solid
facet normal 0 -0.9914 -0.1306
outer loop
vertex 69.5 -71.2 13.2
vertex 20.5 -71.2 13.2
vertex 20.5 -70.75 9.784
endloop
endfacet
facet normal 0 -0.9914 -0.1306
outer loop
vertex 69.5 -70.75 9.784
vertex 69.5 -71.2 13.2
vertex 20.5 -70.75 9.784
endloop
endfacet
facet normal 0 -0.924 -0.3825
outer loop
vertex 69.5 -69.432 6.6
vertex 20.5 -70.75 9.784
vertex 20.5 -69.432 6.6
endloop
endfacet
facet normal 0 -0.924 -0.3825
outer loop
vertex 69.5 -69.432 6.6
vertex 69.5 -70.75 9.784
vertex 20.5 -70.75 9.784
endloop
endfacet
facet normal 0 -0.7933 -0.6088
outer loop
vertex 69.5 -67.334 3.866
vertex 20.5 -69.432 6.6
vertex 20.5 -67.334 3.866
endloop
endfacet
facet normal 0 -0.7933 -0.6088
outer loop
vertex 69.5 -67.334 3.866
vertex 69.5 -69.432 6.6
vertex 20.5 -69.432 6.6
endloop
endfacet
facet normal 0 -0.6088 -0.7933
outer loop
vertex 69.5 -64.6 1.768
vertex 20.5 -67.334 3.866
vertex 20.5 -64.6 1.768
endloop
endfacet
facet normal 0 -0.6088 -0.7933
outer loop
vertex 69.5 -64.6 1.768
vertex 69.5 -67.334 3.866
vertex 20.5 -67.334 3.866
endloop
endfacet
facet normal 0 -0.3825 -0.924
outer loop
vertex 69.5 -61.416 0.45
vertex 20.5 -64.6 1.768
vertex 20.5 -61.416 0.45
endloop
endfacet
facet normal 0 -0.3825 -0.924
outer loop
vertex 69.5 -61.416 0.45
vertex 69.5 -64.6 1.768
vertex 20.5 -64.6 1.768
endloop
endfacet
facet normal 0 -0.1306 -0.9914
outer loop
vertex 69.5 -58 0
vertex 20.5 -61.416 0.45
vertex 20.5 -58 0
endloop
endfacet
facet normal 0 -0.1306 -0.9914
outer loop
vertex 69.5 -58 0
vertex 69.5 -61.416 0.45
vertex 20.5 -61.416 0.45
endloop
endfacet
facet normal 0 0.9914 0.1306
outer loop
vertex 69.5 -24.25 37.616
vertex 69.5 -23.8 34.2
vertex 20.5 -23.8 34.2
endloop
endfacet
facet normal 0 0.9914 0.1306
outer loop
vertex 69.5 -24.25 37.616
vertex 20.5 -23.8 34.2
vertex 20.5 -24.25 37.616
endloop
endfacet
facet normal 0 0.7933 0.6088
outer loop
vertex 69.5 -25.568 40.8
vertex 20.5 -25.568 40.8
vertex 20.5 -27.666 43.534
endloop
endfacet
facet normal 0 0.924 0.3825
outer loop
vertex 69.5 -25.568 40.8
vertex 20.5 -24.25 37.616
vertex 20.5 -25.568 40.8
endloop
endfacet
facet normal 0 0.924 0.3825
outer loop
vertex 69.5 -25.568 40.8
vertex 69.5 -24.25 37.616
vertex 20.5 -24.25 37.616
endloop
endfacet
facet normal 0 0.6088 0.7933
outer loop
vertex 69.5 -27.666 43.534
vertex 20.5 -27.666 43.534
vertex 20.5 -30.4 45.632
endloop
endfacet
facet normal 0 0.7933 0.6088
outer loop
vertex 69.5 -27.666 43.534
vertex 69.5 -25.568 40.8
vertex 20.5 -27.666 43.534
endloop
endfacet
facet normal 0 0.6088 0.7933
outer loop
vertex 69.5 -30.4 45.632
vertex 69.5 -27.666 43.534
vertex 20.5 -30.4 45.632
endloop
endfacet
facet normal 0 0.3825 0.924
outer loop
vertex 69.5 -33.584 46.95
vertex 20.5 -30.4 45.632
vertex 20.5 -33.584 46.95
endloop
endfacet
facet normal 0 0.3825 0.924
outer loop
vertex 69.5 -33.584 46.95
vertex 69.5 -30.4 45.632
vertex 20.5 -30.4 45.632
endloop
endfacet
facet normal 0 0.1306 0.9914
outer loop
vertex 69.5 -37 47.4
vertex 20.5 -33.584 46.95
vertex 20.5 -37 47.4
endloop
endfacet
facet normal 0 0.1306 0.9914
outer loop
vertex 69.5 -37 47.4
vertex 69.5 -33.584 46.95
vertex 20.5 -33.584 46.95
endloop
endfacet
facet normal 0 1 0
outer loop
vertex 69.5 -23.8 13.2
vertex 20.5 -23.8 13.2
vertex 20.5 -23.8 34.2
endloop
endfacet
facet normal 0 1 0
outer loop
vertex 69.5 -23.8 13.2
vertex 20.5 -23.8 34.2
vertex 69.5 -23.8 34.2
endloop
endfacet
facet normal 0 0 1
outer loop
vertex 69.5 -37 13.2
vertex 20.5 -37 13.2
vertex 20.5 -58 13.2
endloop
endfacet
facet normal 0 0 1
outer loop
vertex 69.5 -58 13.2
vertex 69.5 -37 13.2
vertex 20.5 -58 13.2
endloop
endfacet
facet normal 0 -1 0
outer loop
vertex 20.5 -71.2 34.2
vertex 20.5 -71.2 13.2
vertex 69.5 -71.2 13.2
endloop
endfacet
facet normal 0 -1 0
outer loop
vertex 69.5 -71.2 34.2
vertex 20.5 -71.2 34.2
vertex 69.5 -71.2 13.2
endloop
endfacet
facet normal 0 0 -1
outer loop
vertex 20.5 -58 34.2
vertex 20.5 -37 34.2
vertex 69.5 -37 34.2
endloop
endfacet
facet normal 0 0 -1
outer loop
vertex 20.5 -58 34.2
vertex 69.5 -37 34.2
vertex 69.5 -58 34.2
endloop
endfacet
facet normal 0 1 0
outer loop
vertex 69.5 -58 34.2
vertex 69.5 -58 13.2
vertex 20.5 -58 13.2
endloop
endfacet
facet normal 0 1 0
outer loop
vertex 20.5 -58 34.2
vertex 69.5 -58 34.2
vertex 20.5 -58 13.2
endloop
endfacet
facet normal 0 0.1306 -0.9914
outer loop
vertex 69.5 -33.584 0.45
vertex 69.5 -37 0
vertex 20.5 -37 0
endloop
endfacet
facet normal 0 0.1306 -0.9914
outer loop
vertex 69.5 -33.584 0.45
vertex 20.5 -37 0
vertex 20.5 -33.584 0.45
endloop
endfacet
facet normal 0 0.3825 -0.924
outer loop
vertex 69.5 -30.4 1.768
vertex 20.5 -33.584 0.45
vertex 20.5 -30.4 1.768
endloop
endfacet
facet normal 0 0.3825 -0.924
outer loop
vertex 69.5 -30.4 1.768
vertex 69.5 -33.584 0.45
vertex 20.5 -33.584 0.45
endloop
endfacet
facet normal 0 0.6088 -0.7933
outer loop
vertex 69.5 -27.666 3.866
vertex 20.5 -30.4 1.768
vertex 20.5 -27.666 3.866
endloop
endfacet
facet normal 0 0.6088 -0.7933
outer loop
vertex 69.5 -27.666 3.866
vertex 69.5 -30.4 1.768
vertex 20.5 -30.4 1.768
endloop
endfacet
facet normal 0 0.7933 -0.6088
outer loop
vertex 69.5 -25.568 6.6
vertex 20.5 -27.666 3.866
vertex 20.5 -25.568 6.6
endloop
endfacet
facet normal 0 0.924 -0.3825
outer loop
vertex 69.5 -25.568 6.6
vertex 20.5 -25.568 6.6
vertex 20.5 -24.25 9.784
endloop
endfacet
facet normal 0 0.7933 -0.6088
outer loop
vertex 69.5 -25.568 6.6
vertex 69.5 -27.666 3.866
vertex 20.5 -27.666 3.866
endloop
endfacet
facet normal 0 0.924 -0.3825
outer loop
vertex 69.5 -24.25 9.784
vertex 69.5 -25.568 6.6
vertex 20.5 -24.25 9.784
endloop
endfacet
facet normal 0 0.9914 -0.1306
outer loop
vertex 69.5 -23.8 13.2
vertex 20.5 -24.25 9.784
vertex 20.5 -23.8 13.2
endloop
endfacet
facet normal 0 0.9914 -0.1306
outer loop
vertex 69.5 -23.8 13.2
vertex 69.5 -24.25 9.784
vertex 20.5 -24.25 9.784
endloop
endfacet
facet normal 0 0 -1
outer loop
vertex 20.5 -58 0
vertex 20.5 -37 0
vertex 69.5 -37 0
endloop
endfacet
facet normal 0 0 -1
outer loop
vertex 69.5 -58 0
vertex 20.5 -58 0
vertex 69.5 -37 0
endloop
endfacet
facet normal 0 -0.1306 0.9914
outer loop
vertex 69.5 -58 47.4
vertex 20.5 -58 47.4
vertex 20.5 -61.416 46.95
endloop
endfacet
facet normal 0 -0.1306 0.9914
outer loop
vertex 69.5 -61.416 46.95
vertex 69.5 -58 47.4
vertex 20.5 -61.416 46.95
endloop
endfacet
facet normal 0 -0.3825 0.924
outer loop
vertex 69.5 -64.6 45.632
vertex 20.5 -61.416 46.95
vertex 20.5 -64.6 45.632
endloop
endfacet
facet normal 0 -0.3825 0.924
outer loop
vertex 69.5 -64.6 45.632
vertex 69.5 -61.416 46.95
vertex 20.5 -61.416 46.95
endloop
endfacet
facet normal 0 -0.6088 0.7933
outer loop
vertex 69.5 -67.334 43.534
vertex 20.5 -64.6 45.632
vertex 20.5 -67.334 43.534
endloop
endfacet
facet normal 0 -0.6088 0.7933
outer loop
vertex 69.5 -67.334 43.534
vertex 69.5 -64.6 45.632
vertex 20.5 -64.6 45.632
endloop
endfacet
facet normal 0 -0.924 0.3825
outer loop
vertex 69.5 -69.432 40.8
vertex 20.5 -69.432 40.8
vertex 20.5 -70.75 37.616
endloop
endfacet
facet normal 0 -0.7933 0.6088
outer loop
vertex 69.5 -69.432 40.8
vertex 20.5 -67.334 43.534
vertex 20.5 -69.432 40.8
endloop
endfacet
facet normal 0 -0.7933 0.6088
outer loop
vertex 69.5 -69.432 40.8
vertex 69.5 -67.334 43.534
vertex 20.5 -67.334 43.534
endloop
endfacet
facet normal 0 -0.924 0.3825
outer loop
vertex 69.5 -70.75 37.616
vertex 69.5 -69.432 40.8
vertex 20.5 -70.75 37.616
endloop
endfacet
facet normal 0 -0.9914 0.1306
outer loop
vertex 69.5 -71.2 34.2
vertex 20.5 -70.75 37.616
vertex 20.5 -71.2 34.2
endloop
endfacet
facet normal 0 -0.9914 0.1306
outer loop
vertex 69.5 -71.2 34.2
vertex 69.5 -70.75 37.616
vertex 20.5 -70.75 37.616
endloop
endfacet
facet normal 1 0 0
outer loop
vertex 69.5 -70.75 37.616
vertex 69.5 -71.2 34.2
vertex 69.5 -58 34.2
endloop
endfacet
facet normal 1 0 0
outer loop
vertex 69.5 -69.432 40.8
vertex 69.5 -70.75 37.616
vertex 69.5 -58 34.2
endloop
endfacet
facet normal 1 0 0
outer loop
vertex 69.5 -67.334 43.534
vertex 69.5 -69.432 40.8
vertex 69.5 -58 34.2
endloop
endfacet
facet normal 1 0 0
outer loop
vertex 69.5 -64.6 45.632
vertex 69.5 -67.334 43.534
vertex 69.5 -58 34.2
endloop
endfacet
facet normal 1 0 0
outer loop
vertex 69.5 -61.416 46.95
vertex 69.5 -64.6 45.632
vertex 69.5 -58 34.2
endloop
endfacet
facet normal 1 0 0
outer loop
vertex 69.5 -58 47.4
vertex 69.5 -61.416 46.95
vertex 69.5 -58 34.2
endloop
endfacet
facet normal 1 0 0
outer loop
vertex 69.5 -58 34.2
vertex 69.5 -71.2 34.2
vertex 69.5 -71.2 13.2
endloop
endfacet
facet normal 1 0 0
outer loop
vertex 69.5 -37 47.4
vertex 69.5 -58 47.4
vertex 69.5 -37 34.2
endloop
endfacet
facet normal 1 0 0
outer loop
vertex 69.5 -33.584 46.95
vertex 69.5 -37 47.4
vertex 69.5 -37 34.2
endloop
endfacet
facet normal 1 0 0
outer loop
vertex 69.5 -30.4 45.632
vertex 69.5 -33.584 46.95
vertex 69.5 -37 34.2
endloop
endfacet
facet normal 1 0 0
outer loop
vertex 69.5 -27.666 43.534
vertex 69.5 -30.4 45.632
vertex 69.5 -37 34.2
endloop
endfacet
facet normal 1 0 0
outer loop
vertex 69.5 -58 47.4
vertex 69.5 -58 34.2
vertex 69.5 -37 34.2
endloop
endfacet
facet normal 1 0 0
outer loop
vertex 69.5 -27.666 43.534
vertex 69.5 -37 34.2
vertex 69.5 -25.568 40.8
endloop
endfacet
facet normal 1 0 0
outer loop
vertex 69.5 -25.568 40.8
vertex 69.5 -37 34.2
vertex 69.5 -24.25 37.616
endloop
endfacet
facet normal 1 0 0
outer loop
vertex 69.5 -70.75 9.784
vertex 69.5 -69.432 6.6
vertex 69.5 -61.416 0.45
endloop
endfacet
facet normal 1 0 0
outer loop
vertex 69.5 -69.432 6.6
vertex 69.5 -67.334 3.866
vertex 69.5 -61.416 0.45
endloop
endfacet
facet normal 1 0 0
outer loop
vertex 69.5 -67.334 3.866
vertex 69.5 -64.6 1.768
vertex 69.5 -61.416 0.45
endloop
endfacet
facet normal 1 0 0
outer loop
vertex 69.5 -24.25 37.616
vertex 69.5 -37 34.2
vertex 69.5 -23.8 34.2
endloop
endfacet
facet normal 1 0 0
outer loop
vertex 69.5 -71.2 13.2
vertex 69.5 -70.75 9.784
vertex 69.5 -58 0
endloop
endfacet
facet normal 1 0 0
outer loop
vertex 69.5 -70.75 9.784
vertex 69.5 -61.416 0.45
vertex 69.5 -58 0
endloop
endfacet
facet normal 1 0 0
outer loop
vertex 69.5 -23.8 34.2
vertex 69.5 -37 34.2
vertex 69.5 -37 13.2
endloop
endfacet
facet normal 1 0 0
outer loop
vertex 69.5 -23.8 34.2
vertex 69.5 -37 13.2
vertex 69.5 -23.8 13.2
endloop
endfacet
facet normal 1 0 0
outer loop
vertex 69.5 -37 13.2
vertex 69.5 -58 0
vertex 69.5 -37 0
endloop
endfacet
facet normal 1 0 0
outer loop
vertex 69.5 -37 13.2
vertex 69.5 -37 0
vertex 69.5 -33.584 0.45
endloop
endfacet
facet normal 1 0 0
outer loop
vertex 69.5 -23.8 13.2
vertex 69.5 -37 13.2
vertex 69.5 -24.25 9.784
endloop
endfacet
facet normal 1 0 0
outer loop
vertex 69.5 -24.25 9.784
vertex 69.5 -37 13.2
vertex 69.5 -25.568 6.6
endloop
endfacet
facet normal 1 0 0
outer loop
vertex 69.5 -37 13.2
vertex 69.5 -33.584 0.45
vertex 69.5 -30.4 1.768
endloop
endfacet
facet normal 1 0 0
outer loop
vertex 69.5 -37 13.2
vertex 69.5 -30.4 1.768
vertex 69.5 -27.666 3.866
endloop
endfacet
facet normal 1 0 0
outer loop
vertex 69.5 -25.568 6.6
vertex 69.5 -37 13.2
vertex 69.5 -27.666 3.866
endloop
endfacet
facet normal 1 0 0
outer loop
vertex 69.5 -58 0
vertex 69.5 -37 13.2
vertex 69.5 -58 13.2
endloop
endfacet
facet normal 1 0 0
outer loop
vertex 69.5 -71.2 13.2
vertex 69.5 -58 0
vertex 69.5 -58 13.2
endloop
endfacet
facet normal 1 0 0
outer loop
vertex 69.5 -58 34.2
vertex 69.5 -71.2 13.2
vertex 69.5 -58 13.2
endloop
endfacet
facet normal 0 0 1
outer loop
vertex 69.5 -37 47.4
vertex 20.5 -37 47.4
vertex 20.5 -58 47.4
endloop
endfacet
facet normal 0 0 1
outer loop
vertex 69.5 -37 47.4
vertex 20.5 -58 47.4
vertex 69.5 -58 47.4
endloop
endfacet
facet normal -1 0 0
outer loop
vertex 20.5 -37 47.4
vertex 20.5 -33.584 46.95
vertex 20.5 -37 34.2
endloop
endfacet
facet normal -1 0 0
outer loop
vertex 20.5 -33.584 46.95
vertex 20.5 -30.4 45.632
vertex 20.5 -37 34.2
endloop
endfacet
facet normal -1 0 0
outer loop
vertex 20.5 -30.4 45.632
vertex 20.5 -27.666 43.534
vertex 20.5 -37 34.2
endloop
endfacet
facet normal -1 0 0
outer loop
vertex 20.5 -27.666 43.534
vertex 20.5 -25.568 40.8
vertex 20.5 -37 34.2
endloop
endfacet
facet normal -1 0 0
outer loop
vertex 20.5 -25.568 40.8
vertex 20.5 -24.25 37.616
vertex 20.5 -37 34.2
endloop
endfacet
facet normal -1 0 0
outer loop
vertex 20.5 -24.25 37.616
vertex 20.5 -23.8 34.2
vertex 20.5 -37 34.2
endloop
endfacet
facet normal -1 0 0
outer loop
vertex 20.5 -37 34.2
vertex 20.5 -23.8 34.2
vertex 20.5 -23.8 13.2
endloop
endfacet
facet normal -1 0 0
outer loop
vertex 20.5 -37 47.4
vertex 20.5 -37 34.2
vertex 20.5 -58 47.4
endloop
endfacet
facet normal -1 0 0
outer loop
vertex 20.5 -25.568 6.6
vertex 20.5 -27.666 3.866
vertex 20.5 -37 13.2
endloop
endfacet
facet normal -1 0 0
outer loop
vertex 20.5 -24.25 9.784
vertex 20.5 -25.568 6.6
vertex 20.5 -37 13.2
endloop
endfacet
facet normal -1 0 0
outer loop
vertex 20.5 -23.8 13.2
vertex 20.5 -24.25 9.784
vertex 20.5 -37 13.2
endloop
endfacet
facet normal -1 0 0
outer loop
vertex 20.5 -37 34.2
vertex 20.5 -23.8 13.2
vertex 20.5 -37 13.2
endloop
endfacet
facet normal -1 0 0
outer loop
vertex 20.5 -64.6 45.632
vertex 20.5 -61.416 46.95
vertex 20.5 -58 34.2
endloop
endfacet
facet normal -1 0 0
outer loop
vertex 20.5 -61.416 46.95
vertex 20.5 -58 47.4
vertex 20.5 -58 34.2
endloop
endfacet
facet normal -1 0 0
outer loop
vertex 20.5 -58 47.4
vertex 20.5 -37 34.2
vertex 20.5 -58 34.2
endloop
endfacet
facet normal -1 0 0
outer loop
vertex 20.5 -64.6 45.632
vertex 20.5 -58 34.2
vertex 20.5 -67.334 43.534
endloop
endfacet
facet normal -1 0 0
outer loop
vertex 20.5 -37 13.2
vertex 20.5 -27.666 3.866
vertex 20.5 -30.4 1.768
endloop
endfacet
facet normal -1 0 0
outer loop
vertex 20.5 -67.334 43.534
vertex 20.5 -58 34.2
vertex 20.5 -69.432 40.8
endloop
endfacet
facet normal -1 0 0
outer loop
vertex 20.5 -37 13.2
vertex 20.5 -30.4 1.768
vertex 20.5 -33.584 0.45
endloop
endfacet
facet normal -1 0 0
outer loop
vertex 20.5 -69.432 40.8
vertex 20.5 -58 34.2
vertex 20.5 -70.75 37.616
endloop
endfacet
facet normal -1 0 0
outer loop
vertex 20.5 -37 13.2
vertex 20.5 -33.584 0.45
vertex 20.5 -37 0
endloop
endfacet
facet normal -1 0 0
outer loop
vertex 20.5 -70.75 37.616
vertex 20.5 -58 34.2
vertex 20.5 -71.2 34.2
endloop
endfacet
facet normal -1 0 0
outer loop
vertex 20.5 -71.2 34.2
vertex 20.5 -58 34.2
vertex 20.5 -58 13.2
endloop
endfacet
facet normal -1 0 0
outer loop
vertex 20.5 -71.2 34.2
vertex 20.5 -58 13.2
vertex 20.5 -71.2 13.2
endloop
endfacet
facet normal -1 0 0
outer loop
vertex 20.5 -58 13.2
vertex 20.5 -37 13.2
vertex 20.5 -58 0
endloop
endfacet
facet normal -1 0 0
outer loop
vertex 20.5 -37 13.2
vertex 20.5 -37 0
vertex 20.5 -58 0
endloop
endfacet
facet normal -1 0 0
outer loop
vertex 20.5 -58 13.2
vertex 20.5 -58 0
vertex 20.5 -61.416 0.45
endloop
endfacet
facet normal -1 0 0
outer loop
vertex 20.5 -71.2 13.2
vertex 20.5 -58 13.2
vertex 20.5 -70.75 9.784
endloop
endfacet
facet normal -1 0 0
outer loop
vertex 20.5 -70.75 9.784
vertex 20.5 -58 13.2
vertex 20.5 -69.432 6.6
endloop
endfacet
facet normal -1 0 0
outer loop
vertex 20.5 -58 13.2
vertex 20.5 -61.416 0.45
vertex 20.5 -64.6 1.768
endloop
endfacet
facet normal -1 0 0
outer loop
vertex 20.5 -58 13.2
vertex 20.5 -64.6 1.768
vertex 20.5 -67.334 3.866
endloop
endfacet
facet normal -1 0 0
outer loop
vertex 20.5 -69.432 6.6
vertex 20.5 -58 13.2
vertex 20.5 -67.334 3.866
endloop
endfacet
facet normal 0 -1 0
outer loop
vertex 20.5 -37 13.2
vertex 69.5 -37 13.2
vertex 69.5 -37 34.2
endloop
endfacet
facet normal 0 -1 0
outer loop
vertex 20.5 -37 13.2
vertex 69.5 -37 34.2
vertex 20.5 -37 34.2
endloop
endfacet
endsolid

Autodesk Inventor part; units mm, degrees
ref_plane "YZ Plane" through (0, 0, 0) normal (1, 0, 0) x (0, 1, 0)
ref_plane "XZ Plane" through (0, 0, 0) normal (0, 1, 0) x (-1, 0, 0)
ref_plane "XY Plane" through (0, 0, 0) normal (0, 0, 1) x (1, 0, 0)
sketch "Sketch1" plane through (0, 0, 0) normal (0, 0, 1) x (1, 0, 0)
  point P0 (0, 0)
sketch "LAYER1" plane through (0, 0, 0) normal (0, 0, 1) x (1, 0, 0)
  line L0 (70, 20.5) -> (90, 20.5)
  line L1 (90, 20.5) -> (90, 57.5)
  line L2 (90, 57.5) -> (0, 57.5)
  line L3 (0, 57.5) -> (0, -57.5)
  line L4 (0, -57.5) -> (90, -57.5)
  line L5 (90, -57.5) -> (90, -20.5)
  line L6 (90, -20.5) -> (70, -20.5)
  line L7 (70, -20.5) -> (70, -37.5)
  line L8 (70, -37.5) -> (20, -37.5)
  line L9 (20, -37.5) -> (20, 37.5)
  line L10 (20, 37.5) -> (70, 37.5)
  line L11 (70, 37.5) -> (70, 20.5)
sketch "LAYER2" plane through (0, 0, 0) normal (0, 0, 1) x (1, 0, 0)
  line L0 (20.1, -20) -> (110.1, -20)
  line L1 (110.1, -20) -> (110.1, 20)
  line L2 (110.1, 20) -> (20.1, 20)
  line L3 (20.1, 20) -> (20.1, -20)
sketch "LAYER3" plane through (0, 0, 0) normal (0, 0, 1) x (1, 0, 0)
  line L0 (20.5, -71.2) -> (69.5, -71.2)
  line L1 (69.5, -71.2) -> (69.5, -58)
  line L2 (69.5, -58) -> (20.5, -58)
  line L3 (20.5, -58) -> (20.5, -71.2)
sketch "LAYER4" plane through (0, 0, 0) normal (0, 0, 1) x (1, 0, 0)
  line L0 (20.5, -23.8) -> (69.5, -23.8)
  line L1 (69.5, -23.8) -> (69.5, -37)
  line L2 (69.5, -37) -> (20.5, -37)
  line L3 (20.5, -37) -> (20.5, -23.8)
sketch "LAYER5" plane through (0, 0, 0) normal (0, 0, 1) x (1, 0, 0)
  line L0 (20.5, 23.8) -> (69.5, 23.8)
  line L1 (69.5, 23.8) -> (69.5, 37)
  line L2 (69.5, 37) -> (20.5, 37)
  line L3 (20.5, 37) -> (20.5, 23.8)
sketch "LAYER6" plane through (0, 0, 0) normal (0, 0, 1) x (1, 0, 0)
  line L0 (20.5, 71.2) -> (69.5, 71.2)
  line L1 (69.5, 71.2) -> (69.5, 58)
  line L2 (69.5, 58) -> (20.5, 58)
  line L3 (20.5, 58) -> (20.5, 71.2)
extrude "Extrusion3" add sketch "LAYER3" along normal blind 47.4
extrude "Extrusion4" add sketch "LAYER4" along normal blind 47.4
sketch "Sketch9" plane through (20.5, -37, 0) normal (-1, 0, 0) x (0, 0, 1)
  line L0 (0, 0) -> (47.4, 0) projected
  line L1 (0, -21) -> (47.4, -21) projected
  line L2 (47.4, 0) -> (47.4, -21)
  line L3 (0, 0) -> (0, -21)
  line L4 (13.2, 0) -> (13.2, -21)
  line L5 (34.2, 0) -> (34.2, -21)
  point P0 (0, 37)
  dimension "d12" = 13.2
  dimension "d13" = 13.2
extrude "Extrusion6" add sketch "Sketch9" against normal up to surface (49 mm away) contours L0 L4 L1 L3 | L0 L2 L1 L5
fillet "Fillet1" radius 13.2 4 edges at (45, -23.8, 47.4) (45, -71.2, 47.4) (45, -71.2, 0) (45, -23.8, 0)
properties part number "Winding"
